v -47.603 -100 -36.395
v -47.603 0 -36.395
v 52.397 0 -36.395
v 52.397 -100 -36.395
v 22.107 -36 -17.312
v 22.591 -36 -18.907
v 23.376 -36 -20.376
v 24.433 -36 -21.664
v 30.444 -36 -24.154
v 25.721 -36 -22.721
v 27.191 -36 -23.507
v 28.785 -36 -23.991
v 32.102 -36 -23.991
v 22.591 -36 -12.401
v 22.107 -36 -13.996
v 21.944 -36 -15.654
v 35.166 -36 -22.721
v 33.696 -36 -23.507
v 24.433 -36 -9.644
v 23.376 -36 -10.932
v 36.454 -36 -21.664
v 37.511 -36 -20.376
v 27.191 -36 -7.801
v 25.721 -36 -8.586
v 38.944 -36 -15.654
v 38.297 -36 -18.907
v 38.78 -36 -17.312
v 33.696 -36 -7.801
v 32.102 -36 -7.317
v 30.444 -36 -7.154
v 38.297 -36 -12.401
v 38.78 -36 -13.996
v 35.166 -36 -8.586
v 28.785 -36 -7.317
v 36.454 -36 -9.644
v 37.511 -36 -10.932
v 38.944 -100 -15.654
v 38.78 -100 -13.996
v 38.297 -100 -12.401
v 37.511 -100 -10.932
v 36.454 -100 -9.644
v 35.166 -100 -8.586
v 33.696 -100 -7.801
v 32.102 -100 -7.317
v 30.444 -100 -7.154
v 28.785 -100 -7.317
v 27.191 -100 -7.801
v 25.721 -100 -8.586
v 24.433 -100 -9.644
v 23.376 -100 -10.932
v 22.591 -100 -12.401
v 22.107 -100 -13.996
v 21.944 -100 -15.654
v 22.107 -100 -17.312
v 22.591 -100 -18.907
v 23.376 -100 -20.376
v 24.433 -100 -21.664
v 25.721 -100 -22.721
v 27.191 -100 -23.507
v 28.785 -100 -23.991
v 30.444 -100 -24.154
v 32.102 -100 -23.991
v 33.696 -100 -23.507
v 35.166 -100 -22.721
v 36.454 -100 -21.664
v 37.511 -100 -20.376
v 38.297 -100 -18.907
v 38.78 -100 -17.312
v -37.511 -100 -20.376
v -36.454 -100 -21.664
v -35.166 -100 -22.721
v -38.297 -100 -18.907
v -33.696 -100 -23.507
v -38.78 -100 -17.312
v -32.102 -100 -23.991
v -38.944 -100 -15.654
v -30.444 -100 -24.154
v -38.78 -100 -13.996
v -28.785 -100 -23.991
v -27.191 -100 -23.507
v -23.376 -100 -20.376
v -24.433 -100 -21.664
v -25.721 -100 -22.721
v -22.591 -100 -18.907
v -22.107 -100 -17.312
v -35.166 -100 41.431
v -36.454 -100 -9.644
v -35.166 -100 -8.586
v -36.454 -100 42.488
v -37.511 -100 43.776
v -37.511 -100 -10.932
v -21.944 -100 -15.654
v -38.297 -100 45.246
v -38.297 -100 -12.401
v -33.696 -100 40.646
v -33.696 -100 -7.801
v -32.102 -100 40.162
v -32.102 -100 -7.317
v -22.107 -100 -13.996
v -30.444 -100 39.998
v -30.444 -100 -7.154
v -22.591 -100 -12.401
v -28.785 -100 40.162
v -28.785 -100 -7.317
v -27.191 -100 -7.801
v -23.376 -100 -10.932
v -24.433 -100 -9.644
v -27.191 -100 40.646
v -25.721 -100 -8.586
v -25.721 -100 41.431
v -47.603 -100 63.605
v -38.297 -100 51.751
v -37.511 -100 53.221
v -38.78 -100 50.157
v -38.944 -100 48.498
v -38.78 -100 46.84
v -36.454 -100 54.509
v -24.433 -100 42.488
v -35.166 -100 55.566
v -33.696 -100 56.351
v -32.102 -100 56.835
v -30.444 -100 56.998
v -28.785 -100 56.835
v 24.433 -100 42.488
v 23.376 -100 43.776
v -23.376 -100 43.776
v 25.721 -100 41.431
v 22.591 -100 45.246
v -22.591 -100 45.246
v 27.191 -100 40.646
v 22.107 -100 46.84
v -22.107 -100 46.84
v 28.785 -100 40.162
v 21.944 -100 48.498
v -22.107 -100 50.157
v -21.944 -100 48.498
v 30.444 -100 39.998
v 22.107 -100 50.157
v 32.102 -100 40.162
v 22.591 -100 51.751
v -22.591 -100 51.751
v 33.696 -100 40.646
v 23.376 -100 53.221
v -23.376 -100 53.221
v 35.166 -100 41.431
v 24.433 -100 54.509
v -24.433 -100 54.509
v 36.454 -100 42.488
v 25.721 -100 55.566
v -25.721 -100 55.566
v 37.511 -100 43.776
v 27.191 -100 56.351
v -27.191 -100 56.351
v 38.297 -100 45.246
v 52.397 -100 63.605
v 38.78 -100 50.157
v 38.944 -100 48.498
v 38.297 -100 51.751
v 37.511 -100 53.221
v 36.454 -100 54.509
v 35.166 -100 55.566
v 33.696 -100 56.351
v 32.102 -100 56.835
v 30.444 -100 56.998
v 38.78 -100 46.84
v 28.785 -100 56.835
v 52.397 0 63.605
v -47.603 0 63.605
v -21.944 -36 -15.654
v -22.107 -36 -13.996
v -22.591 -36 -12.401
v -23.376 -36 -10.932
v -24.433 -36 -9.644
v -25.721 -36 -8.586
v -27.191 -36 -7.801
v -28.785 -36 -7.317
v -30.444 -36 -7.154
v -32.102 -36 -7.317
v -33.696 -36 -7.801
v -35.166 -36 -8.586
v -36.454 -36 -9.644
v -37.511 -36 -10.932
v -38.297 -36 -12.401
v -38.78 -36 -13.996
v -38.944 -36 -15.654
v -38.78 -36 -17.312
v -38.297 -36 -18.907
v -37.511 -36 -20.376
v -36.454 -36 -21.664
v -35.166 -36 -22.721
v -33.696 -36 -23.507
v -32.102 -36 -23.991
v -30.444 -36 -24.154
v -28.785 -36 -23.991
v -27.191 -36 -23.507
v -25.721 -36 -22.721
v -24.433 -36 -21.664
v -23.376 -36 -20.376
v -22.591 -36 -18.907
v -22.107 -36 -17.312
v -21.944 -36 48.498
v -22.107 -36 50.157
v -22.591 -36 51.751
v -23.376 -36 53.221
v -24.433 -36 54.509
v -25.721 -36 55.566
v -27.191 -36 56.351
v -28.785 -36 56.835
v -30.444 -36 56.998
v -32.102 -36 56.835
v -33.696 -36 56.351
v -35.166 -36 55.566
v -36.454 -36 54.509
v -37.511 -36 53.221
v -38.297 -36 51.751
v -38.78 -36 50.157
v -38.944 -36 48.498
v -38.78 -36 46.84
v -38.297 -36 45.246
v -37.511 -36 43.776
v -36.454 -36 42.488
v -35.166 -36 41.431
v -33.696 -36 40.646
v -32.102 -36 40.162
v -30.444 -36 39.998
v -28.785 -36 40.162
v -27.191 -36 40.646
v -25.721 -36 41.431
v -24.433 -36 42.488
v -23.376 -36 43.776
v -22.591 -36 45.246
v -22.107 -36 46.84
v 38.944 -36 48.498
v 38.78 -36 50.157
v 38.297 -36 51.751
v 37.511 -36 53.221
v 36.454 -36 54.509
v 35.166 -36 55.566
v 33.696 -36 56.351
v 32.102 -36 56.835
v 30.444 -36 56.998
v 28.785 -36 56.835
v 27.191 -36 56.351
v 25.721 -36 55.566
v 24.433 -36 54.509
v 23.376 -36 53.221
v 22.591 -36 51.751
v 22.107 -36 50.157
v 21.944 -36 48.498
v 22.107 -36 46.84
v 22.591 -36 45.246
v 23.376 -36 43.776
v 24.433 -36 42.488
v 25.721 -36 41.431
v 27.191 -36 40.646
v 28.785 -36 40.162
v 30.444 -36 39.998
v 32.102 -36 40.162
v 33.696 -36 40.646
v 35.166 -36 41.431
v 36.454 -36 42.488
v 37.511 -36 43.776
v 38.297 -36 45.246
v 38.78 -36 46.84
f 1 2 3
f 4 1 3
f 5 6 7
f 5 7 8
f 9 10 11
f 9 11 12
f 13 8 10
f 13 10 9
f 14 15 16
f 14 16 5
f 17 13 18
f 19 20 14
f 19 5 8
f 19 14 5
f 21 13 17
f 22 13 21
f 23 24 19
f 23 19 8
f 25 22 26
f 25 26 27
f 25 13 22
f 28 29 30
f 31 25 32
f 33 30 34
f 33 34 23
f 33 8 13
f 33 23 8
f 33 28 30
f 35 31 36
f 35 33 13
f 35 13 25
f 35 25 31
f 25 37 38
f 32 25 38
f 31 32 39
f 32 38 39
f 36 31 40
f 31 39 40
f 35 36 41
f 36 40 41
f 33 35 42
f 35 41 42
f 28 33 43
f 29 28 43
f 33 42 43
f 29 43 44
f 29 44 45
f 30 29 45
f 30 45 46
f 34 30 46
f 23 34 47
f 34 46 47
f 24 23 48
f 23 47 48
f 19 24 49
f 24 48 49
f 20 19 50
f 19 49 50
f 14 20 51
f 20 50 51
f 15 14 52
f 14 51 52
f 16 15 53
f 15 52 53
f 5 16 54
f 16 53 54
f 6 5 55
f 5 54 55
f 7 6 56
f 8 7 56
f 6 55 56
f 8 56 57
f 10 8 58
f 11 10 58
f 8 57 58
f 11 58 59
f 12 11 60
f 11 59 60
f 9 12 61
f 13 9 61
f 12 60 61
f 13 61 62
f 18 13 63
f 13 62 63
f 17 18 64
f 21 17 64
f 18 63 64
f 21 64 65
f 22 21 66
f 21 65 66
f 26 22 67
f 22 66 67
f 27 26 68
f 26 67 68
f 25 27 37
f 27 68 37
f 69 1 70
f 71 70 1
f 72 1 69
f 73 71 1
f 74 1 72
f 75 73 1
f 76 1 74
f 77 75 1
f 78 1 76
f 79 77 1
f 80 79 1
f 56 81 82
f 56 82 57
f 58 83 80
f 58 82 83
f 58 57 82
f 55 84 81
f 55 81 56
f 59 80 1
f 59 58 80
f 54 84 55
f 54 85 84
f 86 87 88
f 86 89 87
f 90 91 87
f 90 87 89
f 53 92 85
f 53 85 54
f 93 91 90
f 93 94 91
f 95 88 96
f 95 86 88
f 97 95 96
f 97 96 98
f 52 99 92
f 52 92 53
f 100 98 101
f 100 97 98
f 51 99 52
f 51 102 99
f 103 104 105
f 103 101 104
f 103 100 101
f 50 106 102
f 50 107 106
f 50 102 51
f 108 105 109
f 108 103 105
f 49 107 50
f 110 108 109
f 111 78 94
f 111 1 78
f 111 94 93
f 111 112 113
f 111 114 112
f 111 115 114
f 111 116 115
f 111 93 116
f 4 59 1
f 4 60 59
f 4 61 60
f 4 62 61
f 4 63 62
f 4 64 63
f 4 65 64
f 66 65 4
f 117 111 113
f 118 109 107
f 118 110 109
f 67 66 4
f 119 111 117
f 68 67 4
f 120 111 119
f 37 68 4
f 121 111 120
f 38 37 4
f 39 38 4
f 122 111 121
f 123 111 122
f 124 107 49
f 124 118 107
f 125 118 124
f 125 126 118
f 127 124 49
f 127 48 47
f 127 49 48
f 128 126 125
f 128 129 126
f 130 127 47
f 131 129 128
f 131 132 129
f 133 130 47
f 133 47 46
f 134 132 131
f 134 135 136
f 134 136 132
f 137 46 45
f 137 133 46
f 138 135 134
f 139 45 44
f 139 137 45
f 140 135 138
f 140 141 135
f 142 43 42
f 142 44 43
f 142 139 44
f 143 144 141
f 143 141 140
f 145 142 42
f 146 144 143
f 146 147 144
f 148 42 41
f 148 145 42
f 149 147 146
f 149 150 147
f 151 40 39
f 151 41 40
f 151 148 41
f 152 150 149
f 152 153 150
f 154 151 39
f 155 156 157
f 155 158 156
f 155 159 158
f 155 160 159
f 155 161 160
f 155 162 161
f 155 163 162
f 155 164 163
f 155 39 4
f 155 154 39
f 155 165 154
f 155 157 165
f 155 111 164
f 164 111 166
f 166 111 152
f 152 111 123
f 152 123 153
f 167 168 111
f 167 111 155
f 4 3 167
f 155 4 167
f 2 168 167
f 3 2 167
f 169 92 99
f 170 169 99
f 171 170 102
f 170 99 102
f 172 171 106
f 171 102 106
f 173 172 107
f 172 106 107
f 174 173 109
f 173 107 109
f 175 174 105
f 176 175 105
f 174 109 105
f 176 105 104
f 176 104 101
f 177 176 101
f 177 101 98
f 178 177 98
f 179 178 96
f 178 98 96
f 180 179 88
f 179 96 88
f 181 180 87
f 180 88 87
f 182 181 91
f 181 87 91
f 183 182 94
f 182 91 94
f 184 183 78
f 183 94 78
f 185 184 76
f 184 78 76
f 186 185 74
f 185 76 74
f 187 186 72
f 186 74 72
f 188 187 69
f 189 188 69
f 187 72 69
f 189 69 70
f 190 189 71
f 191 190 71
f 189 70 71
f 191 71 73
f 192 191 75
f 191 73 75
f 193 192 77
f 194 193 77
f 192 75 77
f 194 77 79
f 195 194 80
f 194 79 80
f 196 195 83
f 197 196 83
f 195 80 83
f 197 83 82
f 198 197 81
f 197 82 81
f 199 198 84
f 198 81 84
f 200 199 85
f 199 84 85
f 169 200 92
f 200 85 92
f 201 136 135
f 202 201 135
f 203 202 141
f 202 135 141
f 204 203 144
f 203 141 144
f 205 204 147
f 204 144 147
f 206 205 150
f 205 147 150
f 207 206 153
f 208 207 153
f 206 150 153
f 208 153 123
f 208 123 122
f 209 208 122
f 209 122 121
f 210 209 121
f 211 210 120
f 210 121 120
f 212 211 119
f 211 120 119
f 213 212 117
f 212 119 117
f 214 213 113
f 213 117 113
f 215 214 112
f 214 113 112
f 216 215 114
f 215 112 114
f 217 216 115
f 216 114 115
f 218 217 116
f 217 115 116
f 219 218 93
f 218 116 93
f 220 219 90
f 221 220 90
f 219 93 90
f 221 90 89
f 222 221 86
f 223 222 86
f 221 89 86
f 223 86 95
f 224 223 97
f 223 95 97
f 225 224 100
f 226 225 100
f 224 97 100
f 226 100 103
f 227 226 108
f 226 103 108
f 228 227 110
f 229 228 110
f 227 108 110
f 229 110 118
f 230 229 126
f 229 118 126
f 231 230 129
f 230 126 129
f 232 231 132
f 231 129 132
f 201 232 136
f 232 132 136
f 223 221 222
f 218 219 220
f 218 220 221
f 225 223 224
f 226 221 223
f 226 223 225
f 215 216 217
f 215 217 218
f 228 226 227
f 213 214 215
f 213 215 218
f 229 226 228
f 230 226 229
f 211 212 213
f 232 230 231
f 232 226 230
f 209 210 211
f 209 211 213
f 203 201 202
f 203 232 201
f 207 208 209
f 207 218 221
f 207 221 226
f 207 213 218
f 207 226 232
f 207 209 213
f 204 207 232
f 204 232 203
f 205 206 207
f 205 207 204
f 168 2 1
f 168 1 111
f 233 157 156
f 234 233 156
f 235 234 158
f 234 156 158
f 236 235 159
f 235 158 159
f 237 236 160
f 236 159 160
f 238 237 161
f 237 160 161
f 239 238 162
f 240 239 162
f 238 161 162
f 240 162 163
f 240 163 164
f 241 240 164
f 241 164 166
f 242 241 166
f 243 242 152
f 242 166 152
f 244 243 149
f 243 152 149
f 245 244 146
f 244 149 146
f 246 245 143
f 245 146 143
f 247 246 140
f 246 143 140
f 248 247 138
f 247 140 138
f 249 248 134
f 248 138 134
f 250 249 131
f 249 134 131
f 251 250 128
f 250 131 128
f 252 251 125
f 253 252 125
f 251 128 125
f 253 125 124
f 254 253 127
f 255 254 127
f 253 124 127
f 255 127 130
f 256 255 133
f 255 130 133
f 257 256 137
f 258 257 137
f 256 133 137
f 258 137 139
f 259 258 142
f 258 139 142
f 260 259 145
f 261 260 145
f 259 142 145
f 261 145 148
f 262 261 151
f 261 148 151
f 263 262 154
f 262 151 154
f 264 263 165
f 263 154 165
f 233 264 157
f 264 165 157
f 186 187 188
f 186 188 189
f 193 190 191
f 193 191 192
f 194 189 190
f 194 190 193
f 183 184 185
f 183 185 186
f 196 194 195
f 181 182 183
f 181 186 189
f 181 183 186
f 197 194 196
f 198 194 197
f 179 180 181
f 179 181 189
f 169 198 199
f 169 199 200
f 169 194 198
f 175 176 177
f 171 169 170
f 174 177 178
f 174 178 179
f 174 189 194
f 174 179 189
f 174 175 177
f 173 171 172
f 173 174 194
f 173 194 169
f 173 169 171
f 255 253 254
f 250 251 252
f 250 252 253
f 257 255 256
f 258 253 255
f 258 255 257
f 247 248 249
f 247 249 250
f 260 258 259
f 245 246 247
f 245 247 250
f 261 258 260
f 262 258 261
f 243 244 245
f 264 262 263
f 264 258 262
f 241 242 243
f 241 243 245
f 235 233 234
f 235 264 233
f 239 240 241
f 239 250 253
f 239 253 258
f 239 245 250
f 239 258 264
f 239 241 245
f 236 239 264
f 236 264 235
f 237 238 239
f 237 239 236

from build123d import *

# Parameters (mm, degrees)
F0_W     = 100
F0_H     = 100
F1_DEPTH = 100
F2_R     = 8.5
F3_DEPTH = 64
F5_ANGLE = 180


# Not quite as in the source:
# - a feature names something its author has since deleted; it is built from what else it names


with BuildPart() as f1:
    # F0 (on Front) → F1 (new body)
    with BuildSketch(Plane.XZ):
        with Locations((2.3967929184, 13.6052064598)):
            Rectangle(F0_W, F0_H)
    extrude(amount=F1_DEPTH)

    # F2 (on face) → F3 (cut)
    with BuildSketch(Plane.XZ.offset(100)):
        with Locations((30.443597585, 48.4984777868)):
            Circle(F2_R)
        with Locations((-30.443597585, -15.6539641321)):
            Circle(F2_R)
        with Locations((30.443597585, -15.6539641321)):
            Circle(F2_R)
        with Locations((-30.443597585, 48.4984777868)):
            Circle(F2_R)
    extrude(amount=-F3_DEPTH, mode=Mode.SUBTRACT)

    # F4 (on face) → F5 (revolve, cut)
    with BuildSketch(Plane.XZ.offset(100)):
        with BuildLine():
            Line((0, 0), (0, 26.83))
            ThreePointArc((0, 26.83), (-13.415, 13.415), (0, 0))
        make_face()
    revolve(axis=Axis((0, -100, 14.3139522988), (0, 0, 1)), revolution_arc=F5_ANGLE, mode=Mode.SUBTRACT)


solid = f1.part
